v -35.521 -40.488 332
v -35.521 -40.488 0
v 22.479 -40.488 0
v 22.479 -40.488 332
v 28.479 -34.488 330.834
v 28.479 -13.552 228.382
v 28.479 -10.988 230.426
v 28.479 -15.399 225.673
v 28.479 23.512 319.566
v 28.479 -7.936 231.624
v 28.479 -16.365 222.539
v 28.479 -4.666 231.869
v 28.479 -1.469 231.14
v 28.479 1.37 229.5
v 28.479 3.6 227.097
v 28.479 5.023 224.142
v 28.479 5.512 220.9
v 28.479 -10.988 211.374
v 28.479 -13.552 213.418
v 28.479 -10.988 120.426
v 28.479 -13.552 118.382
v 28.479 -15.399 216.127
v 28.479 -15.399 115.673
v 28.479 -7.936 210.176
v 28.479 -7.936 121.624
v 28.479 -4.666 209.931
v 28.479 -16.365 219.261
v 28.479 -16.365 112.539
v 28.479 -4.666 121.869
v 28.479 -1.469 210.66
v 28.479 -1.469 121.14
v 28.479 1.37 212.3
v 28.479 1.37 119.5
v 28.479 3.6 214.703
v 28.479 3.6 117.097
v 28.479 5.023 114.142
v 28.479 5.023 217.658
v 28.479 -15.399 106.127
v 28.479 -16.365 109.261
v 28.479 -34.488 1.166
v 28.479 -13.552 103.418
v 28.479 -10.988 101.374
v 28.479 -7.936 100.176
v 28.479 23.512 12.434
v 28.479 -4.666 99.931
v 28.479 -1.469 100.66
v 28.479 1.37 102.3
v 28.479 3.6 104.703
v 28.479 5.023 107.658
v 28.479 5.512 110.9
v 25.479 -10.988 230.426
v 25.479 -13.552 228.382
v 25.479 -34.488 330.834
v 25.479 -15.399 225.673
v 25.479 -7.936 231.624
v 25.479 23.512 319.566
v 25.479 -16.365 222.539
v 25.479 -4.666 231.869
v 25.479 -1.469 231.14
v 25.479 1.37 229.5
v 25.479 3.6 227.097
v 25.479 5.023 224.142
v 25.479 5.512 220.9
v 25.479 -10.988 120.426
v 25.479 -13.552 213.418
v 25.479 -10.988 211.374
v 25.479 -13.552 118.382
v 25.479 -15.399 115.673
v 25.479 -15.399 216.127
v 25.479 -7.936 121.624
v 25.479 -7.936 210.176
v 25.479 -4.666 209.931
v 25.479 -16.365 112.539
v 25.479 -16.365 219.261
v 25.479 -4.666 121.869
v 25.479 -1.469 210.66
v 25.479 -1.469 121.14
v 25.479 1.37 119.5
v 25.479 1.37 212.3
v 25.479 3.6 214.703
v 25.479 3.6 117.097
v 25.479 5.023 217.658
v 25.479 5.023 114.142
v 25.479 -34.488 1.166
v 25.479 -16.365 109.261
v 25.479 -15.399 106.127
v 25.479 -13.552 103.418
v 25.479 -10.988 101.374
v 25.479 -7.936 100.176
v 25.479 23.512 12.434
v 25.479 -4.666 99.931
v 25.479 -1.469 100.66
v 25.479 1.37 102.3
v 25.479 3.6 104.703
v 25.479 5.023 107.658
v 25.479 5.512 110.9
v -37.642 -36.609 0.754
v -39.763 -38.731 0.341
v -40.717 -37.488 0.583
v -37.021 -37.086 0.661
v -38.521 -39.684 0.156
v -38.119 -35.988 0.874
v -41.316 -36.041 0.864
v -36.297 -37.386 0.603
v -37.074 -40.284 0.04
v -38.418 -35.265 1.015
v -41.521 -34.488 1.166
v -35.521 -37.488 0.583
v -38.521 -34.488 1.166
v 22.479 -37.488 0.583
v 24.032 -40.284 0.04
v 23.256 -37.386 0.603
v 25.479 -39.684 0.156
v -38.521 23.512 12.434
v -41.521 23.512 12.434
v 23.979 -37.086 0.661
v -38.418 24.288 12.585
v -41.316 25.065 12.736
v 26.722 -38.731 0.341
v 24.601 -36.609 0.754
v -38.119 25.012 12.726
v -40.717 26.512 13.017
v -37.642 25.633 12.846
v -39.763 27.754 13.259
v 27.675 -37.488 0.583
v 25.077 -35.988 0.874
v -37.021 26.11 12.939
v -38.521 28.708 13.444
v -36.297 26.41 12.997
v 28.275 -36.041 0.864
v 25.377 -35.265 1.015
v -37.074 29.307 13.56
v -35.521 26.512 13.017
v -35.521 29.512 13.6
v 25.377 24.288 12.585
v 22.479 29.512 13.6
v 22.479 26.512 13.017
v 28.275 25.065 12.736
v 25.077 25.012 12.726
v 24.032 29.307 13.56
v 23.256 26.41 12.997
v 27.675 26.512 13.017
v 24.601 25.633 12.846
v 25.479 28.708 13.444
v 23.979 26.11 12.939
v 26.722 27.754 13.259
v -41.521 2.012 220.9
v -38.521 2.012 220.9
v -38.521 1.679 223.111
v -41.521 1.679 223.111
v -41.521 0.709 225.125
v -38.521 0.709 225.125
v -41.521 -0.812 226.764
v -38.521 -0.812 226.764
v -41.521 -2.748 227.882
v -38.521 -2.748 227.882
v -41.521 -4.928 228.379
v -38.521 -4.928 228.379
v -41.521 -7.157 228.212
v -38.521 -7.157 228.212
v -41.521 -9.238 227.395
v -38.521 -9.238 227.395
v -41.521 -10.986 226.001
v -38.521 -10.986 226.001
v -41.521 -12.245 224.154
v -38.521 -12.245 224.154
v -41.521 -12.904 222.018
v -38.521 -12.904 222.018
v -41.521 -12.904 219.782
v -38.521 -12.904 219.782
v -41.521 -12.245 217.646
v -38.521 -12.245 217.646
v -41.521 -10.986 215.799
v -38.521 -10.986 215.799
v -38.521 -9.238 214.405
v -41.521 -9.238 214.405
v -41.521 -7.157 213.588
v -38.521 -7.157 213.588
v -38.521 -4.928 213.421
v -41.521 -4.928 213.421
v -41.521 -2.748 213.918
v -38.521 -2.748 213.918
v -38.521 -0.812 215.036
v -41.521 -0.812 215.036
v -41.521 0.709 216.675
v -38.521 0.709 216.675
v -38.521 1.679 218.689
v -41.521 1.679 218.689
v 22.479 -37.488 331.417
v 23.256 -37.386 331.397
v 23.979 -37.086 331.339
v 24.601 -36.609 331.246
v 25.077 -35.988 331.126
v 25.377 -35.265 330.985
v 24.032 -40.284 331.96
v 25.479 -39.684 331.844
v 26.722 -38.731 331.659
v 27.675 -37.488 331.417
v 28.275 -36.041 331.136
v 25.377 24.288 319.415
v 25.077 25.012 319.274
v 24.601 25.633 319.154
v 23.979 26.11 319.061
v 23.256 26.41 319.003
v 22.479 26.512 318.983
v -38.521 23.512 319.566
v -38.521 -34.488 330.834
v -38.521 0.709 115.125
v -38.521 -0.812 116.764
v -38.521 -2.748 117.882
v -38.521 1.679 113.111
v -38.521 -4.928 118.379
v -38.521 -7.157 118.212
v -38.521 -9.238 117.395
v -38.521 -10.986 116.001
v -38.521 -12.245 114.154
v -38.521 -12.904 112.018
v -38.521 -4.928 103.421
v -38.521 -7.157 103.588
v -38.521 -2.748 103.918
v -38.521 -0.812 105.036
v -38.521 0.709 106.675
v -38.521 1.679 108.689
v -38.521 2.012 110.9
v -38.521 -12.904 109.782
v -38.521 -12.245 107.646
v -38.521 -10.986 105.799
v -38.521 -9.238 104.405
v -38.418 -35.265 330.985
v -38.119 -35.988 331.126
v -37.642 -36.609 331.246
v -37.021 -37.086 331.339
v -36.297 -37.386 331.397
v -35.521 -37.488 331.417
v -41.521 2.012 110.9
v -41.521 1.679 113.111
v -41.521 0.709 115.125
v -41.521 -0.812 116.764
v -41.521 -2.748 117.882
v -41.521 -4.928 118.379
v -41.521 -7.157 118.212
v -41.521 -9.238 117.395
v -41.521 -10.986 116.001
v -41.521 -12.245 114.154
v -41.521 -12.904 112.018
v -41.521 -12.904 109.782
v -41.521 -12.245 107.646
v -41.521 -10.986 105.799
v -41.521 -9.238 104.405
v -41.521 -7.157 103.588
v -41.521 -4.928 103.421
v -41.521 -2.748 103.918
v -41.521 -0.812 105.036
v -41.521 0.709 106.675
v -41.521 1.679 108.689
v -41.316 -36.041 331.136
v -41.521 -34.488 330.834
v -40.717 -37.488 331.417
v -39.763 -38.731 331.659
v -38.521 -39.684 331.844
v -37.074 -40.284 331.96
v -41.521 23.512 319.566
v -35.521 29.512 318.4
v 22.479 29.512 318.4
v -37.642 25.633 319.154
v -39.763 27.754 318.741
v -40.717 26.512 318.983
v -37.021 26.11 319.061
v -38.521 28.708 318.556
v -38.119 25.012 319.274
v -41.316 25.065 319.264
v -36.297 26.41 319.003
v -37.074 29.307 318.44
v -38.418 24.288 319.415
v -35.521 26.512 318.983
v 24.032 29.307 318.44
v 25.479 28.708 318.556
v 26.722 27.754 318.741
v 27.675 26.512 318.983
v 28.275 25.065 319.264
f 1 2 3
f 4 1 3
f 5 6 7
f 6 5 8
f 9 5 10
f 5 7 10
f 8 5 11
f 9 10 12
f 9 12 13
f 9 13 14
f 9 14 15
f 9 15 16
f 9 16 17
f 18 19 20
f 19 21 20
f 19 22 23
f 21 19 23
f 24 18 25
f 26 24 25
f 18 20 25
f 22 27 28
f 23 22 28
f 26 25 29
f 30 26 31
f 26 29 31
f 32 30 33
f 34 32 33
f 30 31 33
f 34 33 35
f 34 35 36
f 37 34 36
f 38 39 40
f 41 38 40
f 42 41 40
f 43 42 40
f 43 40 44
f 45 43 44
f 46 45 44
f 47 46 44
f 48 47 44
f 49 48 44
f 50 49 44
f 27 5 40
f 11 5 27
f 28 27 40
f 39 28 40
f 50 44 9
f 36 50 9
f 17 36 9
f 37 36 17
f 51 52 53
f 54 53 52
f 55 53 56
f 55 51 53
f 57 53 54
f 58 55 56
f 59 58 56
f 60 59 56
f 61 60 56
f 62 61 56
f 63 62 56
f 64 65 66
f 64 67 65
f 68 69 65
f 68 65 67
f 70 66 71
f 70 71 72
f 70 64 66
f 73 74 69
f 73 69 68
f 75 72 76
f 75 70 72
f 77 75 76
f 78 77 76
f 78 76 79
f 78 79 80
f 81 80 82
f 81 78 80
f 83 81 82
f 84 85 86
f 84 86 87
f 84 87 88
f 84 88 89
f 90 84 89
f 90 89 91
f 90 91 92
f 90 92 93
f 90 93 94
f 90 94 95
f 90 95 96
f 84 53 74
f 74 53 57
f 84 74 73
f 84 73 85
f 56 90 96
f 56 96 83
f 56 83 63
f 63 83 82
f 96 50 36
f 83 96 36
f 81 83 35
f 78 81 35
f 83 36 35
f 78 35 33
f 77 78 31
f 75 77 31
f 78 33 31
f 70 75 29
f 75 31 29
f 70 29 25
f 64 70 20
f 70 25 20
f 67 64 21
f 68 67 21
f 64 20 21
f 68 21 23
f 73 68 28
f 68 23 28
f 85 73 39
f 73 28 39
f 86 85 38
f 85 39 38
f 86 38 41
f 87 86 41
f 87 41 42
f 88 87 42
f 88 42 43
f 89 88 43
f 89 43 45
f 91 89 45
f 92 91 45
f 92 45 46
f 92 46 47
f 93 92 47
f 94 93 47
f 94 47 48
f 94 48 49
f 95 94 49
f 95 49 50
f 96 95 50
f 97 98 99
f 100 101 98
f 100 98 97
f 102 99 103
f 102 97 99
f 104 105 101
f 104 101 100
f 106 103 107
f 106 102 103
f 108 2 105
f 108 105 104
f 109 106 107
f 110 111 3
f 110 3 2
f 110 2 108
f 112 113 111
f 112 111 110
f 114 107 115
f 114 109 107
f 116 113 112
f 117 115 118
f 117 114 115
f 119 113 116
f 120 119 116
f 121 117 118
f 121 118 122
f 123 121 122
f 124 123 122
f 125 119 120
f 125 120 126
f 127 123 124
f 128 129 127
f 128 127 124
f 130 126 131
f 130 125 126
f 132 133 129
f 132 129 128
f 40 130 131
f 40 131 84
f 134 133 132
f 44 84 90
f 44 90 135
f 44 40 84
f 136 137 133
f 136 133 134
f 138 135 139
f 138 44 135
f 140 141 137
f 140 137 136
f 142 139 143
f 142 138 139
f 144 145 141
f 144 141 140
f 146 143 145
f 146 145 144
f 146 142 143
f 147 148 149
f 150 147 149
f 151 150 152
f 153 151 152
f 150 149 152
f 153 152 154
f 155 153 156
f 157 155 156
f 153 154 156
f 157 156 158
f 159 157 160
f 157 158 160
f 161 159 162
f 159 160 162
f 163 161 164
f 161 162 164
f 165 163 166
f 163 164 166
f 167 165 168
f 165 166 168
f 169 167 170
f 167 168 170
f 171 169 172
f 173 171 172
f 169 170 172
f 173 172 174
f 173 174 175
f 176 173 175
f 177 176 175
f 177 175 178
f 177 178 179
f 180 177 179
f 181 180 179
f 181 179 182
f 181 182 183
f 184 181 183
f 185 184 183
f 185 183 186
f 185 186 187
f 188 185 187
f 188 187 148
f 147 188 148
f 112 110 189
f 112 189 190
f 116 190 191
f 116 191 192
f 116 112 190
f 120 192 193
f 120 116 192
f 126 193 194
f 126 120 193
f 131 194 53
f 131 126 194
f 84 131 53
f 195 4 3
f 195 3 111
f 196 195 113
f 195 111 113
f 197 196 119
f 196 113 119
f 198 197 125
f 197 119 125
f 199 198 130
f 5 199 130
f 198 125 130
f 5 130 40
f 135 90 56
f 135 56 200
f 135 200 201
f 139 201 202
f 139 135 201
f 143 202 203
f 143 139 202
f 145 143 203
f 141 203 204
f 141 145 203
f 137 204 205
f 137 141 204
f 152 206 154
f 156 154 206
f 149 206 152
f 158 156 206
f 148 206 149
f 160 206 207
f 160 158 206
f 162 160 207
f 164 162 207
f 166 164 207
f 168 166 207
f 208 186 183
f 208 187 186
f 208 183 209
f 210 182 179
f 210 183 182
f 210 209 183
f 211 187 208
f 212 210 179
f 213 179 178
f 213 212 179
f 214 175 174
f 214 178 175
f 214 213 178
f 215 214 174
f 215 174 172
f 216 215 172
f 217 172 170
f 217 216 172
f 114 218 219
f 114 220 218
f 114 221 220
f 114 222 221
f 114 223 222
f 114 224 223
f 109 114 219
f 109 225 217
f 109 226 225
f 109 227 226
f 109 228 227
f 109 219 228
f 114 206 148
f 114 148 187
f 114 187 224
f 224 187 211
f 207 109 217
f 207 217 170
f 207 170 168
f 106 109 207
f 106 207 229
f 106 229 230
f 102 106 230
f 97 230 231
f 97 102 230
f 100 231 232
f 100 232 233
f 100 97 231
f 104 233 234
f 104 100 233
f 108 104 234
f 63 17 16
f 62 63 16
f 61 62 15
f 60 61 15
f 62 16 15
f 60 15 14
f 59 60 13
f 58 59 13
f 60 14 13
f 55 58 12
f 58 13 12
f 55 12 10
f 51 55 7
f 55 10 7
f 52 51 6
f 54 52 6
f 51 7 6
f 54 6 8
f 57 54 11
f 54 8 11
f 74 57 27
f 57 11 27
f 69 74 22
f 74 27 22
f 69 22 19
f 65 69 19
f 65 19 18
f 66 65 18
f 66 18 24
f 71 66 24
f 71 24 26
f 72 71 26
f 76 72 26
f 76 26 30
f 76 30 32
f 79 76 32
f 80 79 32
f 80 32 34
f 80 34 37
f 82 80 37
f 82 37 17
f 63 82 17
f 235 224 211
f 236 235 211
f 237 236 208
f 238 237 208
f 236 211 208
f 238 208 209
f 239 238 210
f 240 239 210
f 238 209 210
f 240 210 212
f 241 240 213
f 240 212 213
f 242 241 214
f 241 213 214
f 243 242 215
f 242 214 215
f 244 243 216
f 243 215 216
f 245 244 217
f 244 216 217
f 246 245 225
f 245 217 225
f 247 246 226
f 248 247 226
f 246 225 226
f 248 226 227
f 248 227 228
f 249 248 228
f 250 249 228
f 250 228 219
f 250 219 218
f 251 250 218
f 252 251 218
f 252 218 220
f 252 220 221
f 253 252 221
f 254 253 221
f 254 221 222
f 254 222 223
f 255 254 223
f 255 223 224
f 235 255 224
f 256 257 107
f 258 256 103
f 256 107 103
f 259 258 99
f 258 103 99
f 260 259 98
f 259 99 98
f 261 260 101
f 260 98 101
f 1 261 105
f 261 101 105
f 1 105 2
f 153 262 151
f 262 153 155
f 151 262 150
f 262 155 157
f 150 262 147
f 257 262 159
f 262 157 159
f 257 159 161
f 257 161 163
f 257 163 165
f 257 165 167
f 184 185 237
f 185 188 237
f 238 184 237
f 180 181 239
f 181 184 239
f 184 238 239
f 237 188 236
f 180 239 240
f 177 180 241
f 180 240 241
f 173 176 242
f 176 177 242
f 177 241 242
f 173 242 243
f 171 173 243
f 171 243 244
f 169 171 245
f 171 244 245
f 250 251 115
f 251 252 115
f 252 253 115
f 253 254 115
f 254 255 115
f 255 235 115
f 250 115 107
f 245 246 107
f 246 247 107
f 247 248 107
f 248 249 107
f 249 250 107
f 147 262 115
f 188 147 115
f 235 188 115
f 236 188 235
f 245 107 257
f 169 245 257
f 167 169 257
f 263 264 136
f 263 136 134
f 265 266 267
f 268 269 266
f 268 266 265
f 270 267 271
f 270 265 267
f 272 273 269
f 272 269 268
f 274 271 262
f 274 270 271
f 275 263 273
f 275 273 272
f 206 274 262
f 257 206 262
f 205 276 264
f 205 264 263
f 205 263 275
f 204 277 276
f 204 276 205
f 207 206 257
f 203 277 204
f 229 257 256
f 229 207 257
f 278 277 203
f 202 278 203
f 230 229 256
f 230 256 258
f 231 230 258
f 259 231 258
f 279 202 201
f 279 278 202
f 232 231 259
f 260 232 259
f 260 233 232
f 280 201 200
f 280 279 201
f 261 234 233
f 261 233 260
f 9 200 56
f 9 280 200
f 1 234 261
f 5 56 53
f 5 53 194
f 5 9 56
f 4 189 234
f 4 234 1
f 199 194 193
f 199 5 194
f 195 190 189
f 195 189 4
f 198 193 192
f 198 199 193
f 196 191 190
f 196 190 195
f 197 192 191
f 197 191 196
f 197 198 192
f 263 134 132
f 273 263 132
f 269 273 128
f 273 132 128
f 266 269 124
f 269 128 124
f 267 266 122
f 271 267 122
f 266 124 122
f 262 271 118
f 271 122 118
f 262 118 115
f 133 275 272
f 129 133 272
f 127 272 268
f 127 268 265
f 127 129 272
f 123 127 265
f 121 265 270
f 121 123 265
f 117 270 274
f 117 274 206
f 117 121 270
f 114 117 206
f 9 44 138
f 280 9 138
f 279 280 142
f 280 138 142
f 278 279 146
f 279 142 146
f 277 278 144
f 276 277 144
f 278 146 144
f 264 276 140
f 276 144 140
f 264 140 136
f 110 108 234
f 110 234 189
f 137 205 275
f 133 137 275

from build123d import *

# Parameters (mm, degrees)
BOSS_EXTRUDE1_DEPTH = 332
SKETCH2_R           = 7.5
CUT_EXTRUDE1_DEPTH  = 330
SKETCH3_R           = 11
CUT_EXTRUDE2_DEPTH  = 5


with BuildPart() as part:
    # Sketch1 → Boss-Extrude1 (new body)
    with BuildSketch(Plane.XY):
        with BuildLine():
            Line((22.479289941, 29.51183432), (-35.520710059, 29.51183432))
            ThreePointArc((-35.520710059, 29.51183432), (-39.763350746, 27.754475007), (-41.520710059, 23.51183432))
            Line((-41.520710059, 23.51183432), (-41.520710059, -34.48816568))
            ThreePointArc((-41.520710059, -34.48816568), (-39.763350746, -38.730806368), (-35.520710059, -40.48816568))
            Line((-35.520710059, -40.48816568), (22.479289941, -40.48816568))
            ThreePointArc((22.479289941, -40.48816568), (26.721930628, -38.730806368), (28.479289941, -34.48816568))
            Line((28.479289941, -34.48816568), (28.479289941, 23.51183432))
            ThreePointArc((28.479289941, 23.51183432), (26.721930628, 27.754475007), (22.479289941, 29.51183432))
        make_face()
        with BuildLine():
            Line((22.479289941, 26.51183432), (-35.520710059, 26.51183432))
            ThreePointArc((-35.520710059, 26.51183432), (-37.642030403, 25.633154663), (-38.520710059, 23.51183432))
            Line((-38.520710059, 23.51183432), (-38.520710059, -34.48816568))
            ThreePointArc((-38.520710059, -34.48816568), (-37.642030403, -36.609486024), (-35.520710059, -37.48816568))
            Line((-35.520710059, -37.48816568), (22.479289941, -37.48816568))
            ThreePointArc((22.479289941, -37.48816568), (24.600610284, -36.609486024), (25.479289941, -34.48816568))
            Line((25.479289941, -34.48816568), (25.479289941, 23.51183432))
            ThreePointArc((25.479289941, 23.51183432), (24.600610284, 25.633154663), (22.479289941, 26.51183432))
        make_face(mode=Mode.SUBTRACT)
    extrude(amount=BOSS_EXTRUDE1_DEPTH)

    # Sketch2 → Cut-Extrude1 (cut)
    with BuildSketch(Plane(origin=(28.479289941, 0, 0), x_dir=(0, 0, -1), z_dir=(1, 0, 0))):
        with Locations(Location((-220.9, -5.48816568, 0), (0, 0, 90))):
            Circle(SKETCH2_R)
        with Locations(Location((-110.9, -5.48816568, 0), (0, 0, 90))):
            Circle(SKETCH2_R)
        Polygon((0, -40.48816568), (-13.6, 29.51183432), (0, 29.51183432), align=None)
        Polygon((-332, -40.48816568), (-332, 29.51183432), (-318.4, 29.51183432), align=None)
    extrude(amount=-CUT_EXTRUDE1_DEPTH, mode=Mode.SUBTRACT)

    # Sketch3 → Cut-Extrude2 (cut)
    with BuildSketch(Plane(origin=(28.479289941, 0, 0), x_dir=(0, 0, -1), z_dir=(1, 0, 0))):
        with Locations(Location((-220.9, -5.48816568, 0), (0, 0, 90))):
            Circle(SKETCH3_R)
        with Locations(Location((-110.9, -5.48816568, 0), (0, 0, 90))):
            Circle(SKETCH3_R)
    extrude(amount=-CUT_EXTRUDE2_DEPTH, mode=Mode.SUBTRACT)


solid = part.part
